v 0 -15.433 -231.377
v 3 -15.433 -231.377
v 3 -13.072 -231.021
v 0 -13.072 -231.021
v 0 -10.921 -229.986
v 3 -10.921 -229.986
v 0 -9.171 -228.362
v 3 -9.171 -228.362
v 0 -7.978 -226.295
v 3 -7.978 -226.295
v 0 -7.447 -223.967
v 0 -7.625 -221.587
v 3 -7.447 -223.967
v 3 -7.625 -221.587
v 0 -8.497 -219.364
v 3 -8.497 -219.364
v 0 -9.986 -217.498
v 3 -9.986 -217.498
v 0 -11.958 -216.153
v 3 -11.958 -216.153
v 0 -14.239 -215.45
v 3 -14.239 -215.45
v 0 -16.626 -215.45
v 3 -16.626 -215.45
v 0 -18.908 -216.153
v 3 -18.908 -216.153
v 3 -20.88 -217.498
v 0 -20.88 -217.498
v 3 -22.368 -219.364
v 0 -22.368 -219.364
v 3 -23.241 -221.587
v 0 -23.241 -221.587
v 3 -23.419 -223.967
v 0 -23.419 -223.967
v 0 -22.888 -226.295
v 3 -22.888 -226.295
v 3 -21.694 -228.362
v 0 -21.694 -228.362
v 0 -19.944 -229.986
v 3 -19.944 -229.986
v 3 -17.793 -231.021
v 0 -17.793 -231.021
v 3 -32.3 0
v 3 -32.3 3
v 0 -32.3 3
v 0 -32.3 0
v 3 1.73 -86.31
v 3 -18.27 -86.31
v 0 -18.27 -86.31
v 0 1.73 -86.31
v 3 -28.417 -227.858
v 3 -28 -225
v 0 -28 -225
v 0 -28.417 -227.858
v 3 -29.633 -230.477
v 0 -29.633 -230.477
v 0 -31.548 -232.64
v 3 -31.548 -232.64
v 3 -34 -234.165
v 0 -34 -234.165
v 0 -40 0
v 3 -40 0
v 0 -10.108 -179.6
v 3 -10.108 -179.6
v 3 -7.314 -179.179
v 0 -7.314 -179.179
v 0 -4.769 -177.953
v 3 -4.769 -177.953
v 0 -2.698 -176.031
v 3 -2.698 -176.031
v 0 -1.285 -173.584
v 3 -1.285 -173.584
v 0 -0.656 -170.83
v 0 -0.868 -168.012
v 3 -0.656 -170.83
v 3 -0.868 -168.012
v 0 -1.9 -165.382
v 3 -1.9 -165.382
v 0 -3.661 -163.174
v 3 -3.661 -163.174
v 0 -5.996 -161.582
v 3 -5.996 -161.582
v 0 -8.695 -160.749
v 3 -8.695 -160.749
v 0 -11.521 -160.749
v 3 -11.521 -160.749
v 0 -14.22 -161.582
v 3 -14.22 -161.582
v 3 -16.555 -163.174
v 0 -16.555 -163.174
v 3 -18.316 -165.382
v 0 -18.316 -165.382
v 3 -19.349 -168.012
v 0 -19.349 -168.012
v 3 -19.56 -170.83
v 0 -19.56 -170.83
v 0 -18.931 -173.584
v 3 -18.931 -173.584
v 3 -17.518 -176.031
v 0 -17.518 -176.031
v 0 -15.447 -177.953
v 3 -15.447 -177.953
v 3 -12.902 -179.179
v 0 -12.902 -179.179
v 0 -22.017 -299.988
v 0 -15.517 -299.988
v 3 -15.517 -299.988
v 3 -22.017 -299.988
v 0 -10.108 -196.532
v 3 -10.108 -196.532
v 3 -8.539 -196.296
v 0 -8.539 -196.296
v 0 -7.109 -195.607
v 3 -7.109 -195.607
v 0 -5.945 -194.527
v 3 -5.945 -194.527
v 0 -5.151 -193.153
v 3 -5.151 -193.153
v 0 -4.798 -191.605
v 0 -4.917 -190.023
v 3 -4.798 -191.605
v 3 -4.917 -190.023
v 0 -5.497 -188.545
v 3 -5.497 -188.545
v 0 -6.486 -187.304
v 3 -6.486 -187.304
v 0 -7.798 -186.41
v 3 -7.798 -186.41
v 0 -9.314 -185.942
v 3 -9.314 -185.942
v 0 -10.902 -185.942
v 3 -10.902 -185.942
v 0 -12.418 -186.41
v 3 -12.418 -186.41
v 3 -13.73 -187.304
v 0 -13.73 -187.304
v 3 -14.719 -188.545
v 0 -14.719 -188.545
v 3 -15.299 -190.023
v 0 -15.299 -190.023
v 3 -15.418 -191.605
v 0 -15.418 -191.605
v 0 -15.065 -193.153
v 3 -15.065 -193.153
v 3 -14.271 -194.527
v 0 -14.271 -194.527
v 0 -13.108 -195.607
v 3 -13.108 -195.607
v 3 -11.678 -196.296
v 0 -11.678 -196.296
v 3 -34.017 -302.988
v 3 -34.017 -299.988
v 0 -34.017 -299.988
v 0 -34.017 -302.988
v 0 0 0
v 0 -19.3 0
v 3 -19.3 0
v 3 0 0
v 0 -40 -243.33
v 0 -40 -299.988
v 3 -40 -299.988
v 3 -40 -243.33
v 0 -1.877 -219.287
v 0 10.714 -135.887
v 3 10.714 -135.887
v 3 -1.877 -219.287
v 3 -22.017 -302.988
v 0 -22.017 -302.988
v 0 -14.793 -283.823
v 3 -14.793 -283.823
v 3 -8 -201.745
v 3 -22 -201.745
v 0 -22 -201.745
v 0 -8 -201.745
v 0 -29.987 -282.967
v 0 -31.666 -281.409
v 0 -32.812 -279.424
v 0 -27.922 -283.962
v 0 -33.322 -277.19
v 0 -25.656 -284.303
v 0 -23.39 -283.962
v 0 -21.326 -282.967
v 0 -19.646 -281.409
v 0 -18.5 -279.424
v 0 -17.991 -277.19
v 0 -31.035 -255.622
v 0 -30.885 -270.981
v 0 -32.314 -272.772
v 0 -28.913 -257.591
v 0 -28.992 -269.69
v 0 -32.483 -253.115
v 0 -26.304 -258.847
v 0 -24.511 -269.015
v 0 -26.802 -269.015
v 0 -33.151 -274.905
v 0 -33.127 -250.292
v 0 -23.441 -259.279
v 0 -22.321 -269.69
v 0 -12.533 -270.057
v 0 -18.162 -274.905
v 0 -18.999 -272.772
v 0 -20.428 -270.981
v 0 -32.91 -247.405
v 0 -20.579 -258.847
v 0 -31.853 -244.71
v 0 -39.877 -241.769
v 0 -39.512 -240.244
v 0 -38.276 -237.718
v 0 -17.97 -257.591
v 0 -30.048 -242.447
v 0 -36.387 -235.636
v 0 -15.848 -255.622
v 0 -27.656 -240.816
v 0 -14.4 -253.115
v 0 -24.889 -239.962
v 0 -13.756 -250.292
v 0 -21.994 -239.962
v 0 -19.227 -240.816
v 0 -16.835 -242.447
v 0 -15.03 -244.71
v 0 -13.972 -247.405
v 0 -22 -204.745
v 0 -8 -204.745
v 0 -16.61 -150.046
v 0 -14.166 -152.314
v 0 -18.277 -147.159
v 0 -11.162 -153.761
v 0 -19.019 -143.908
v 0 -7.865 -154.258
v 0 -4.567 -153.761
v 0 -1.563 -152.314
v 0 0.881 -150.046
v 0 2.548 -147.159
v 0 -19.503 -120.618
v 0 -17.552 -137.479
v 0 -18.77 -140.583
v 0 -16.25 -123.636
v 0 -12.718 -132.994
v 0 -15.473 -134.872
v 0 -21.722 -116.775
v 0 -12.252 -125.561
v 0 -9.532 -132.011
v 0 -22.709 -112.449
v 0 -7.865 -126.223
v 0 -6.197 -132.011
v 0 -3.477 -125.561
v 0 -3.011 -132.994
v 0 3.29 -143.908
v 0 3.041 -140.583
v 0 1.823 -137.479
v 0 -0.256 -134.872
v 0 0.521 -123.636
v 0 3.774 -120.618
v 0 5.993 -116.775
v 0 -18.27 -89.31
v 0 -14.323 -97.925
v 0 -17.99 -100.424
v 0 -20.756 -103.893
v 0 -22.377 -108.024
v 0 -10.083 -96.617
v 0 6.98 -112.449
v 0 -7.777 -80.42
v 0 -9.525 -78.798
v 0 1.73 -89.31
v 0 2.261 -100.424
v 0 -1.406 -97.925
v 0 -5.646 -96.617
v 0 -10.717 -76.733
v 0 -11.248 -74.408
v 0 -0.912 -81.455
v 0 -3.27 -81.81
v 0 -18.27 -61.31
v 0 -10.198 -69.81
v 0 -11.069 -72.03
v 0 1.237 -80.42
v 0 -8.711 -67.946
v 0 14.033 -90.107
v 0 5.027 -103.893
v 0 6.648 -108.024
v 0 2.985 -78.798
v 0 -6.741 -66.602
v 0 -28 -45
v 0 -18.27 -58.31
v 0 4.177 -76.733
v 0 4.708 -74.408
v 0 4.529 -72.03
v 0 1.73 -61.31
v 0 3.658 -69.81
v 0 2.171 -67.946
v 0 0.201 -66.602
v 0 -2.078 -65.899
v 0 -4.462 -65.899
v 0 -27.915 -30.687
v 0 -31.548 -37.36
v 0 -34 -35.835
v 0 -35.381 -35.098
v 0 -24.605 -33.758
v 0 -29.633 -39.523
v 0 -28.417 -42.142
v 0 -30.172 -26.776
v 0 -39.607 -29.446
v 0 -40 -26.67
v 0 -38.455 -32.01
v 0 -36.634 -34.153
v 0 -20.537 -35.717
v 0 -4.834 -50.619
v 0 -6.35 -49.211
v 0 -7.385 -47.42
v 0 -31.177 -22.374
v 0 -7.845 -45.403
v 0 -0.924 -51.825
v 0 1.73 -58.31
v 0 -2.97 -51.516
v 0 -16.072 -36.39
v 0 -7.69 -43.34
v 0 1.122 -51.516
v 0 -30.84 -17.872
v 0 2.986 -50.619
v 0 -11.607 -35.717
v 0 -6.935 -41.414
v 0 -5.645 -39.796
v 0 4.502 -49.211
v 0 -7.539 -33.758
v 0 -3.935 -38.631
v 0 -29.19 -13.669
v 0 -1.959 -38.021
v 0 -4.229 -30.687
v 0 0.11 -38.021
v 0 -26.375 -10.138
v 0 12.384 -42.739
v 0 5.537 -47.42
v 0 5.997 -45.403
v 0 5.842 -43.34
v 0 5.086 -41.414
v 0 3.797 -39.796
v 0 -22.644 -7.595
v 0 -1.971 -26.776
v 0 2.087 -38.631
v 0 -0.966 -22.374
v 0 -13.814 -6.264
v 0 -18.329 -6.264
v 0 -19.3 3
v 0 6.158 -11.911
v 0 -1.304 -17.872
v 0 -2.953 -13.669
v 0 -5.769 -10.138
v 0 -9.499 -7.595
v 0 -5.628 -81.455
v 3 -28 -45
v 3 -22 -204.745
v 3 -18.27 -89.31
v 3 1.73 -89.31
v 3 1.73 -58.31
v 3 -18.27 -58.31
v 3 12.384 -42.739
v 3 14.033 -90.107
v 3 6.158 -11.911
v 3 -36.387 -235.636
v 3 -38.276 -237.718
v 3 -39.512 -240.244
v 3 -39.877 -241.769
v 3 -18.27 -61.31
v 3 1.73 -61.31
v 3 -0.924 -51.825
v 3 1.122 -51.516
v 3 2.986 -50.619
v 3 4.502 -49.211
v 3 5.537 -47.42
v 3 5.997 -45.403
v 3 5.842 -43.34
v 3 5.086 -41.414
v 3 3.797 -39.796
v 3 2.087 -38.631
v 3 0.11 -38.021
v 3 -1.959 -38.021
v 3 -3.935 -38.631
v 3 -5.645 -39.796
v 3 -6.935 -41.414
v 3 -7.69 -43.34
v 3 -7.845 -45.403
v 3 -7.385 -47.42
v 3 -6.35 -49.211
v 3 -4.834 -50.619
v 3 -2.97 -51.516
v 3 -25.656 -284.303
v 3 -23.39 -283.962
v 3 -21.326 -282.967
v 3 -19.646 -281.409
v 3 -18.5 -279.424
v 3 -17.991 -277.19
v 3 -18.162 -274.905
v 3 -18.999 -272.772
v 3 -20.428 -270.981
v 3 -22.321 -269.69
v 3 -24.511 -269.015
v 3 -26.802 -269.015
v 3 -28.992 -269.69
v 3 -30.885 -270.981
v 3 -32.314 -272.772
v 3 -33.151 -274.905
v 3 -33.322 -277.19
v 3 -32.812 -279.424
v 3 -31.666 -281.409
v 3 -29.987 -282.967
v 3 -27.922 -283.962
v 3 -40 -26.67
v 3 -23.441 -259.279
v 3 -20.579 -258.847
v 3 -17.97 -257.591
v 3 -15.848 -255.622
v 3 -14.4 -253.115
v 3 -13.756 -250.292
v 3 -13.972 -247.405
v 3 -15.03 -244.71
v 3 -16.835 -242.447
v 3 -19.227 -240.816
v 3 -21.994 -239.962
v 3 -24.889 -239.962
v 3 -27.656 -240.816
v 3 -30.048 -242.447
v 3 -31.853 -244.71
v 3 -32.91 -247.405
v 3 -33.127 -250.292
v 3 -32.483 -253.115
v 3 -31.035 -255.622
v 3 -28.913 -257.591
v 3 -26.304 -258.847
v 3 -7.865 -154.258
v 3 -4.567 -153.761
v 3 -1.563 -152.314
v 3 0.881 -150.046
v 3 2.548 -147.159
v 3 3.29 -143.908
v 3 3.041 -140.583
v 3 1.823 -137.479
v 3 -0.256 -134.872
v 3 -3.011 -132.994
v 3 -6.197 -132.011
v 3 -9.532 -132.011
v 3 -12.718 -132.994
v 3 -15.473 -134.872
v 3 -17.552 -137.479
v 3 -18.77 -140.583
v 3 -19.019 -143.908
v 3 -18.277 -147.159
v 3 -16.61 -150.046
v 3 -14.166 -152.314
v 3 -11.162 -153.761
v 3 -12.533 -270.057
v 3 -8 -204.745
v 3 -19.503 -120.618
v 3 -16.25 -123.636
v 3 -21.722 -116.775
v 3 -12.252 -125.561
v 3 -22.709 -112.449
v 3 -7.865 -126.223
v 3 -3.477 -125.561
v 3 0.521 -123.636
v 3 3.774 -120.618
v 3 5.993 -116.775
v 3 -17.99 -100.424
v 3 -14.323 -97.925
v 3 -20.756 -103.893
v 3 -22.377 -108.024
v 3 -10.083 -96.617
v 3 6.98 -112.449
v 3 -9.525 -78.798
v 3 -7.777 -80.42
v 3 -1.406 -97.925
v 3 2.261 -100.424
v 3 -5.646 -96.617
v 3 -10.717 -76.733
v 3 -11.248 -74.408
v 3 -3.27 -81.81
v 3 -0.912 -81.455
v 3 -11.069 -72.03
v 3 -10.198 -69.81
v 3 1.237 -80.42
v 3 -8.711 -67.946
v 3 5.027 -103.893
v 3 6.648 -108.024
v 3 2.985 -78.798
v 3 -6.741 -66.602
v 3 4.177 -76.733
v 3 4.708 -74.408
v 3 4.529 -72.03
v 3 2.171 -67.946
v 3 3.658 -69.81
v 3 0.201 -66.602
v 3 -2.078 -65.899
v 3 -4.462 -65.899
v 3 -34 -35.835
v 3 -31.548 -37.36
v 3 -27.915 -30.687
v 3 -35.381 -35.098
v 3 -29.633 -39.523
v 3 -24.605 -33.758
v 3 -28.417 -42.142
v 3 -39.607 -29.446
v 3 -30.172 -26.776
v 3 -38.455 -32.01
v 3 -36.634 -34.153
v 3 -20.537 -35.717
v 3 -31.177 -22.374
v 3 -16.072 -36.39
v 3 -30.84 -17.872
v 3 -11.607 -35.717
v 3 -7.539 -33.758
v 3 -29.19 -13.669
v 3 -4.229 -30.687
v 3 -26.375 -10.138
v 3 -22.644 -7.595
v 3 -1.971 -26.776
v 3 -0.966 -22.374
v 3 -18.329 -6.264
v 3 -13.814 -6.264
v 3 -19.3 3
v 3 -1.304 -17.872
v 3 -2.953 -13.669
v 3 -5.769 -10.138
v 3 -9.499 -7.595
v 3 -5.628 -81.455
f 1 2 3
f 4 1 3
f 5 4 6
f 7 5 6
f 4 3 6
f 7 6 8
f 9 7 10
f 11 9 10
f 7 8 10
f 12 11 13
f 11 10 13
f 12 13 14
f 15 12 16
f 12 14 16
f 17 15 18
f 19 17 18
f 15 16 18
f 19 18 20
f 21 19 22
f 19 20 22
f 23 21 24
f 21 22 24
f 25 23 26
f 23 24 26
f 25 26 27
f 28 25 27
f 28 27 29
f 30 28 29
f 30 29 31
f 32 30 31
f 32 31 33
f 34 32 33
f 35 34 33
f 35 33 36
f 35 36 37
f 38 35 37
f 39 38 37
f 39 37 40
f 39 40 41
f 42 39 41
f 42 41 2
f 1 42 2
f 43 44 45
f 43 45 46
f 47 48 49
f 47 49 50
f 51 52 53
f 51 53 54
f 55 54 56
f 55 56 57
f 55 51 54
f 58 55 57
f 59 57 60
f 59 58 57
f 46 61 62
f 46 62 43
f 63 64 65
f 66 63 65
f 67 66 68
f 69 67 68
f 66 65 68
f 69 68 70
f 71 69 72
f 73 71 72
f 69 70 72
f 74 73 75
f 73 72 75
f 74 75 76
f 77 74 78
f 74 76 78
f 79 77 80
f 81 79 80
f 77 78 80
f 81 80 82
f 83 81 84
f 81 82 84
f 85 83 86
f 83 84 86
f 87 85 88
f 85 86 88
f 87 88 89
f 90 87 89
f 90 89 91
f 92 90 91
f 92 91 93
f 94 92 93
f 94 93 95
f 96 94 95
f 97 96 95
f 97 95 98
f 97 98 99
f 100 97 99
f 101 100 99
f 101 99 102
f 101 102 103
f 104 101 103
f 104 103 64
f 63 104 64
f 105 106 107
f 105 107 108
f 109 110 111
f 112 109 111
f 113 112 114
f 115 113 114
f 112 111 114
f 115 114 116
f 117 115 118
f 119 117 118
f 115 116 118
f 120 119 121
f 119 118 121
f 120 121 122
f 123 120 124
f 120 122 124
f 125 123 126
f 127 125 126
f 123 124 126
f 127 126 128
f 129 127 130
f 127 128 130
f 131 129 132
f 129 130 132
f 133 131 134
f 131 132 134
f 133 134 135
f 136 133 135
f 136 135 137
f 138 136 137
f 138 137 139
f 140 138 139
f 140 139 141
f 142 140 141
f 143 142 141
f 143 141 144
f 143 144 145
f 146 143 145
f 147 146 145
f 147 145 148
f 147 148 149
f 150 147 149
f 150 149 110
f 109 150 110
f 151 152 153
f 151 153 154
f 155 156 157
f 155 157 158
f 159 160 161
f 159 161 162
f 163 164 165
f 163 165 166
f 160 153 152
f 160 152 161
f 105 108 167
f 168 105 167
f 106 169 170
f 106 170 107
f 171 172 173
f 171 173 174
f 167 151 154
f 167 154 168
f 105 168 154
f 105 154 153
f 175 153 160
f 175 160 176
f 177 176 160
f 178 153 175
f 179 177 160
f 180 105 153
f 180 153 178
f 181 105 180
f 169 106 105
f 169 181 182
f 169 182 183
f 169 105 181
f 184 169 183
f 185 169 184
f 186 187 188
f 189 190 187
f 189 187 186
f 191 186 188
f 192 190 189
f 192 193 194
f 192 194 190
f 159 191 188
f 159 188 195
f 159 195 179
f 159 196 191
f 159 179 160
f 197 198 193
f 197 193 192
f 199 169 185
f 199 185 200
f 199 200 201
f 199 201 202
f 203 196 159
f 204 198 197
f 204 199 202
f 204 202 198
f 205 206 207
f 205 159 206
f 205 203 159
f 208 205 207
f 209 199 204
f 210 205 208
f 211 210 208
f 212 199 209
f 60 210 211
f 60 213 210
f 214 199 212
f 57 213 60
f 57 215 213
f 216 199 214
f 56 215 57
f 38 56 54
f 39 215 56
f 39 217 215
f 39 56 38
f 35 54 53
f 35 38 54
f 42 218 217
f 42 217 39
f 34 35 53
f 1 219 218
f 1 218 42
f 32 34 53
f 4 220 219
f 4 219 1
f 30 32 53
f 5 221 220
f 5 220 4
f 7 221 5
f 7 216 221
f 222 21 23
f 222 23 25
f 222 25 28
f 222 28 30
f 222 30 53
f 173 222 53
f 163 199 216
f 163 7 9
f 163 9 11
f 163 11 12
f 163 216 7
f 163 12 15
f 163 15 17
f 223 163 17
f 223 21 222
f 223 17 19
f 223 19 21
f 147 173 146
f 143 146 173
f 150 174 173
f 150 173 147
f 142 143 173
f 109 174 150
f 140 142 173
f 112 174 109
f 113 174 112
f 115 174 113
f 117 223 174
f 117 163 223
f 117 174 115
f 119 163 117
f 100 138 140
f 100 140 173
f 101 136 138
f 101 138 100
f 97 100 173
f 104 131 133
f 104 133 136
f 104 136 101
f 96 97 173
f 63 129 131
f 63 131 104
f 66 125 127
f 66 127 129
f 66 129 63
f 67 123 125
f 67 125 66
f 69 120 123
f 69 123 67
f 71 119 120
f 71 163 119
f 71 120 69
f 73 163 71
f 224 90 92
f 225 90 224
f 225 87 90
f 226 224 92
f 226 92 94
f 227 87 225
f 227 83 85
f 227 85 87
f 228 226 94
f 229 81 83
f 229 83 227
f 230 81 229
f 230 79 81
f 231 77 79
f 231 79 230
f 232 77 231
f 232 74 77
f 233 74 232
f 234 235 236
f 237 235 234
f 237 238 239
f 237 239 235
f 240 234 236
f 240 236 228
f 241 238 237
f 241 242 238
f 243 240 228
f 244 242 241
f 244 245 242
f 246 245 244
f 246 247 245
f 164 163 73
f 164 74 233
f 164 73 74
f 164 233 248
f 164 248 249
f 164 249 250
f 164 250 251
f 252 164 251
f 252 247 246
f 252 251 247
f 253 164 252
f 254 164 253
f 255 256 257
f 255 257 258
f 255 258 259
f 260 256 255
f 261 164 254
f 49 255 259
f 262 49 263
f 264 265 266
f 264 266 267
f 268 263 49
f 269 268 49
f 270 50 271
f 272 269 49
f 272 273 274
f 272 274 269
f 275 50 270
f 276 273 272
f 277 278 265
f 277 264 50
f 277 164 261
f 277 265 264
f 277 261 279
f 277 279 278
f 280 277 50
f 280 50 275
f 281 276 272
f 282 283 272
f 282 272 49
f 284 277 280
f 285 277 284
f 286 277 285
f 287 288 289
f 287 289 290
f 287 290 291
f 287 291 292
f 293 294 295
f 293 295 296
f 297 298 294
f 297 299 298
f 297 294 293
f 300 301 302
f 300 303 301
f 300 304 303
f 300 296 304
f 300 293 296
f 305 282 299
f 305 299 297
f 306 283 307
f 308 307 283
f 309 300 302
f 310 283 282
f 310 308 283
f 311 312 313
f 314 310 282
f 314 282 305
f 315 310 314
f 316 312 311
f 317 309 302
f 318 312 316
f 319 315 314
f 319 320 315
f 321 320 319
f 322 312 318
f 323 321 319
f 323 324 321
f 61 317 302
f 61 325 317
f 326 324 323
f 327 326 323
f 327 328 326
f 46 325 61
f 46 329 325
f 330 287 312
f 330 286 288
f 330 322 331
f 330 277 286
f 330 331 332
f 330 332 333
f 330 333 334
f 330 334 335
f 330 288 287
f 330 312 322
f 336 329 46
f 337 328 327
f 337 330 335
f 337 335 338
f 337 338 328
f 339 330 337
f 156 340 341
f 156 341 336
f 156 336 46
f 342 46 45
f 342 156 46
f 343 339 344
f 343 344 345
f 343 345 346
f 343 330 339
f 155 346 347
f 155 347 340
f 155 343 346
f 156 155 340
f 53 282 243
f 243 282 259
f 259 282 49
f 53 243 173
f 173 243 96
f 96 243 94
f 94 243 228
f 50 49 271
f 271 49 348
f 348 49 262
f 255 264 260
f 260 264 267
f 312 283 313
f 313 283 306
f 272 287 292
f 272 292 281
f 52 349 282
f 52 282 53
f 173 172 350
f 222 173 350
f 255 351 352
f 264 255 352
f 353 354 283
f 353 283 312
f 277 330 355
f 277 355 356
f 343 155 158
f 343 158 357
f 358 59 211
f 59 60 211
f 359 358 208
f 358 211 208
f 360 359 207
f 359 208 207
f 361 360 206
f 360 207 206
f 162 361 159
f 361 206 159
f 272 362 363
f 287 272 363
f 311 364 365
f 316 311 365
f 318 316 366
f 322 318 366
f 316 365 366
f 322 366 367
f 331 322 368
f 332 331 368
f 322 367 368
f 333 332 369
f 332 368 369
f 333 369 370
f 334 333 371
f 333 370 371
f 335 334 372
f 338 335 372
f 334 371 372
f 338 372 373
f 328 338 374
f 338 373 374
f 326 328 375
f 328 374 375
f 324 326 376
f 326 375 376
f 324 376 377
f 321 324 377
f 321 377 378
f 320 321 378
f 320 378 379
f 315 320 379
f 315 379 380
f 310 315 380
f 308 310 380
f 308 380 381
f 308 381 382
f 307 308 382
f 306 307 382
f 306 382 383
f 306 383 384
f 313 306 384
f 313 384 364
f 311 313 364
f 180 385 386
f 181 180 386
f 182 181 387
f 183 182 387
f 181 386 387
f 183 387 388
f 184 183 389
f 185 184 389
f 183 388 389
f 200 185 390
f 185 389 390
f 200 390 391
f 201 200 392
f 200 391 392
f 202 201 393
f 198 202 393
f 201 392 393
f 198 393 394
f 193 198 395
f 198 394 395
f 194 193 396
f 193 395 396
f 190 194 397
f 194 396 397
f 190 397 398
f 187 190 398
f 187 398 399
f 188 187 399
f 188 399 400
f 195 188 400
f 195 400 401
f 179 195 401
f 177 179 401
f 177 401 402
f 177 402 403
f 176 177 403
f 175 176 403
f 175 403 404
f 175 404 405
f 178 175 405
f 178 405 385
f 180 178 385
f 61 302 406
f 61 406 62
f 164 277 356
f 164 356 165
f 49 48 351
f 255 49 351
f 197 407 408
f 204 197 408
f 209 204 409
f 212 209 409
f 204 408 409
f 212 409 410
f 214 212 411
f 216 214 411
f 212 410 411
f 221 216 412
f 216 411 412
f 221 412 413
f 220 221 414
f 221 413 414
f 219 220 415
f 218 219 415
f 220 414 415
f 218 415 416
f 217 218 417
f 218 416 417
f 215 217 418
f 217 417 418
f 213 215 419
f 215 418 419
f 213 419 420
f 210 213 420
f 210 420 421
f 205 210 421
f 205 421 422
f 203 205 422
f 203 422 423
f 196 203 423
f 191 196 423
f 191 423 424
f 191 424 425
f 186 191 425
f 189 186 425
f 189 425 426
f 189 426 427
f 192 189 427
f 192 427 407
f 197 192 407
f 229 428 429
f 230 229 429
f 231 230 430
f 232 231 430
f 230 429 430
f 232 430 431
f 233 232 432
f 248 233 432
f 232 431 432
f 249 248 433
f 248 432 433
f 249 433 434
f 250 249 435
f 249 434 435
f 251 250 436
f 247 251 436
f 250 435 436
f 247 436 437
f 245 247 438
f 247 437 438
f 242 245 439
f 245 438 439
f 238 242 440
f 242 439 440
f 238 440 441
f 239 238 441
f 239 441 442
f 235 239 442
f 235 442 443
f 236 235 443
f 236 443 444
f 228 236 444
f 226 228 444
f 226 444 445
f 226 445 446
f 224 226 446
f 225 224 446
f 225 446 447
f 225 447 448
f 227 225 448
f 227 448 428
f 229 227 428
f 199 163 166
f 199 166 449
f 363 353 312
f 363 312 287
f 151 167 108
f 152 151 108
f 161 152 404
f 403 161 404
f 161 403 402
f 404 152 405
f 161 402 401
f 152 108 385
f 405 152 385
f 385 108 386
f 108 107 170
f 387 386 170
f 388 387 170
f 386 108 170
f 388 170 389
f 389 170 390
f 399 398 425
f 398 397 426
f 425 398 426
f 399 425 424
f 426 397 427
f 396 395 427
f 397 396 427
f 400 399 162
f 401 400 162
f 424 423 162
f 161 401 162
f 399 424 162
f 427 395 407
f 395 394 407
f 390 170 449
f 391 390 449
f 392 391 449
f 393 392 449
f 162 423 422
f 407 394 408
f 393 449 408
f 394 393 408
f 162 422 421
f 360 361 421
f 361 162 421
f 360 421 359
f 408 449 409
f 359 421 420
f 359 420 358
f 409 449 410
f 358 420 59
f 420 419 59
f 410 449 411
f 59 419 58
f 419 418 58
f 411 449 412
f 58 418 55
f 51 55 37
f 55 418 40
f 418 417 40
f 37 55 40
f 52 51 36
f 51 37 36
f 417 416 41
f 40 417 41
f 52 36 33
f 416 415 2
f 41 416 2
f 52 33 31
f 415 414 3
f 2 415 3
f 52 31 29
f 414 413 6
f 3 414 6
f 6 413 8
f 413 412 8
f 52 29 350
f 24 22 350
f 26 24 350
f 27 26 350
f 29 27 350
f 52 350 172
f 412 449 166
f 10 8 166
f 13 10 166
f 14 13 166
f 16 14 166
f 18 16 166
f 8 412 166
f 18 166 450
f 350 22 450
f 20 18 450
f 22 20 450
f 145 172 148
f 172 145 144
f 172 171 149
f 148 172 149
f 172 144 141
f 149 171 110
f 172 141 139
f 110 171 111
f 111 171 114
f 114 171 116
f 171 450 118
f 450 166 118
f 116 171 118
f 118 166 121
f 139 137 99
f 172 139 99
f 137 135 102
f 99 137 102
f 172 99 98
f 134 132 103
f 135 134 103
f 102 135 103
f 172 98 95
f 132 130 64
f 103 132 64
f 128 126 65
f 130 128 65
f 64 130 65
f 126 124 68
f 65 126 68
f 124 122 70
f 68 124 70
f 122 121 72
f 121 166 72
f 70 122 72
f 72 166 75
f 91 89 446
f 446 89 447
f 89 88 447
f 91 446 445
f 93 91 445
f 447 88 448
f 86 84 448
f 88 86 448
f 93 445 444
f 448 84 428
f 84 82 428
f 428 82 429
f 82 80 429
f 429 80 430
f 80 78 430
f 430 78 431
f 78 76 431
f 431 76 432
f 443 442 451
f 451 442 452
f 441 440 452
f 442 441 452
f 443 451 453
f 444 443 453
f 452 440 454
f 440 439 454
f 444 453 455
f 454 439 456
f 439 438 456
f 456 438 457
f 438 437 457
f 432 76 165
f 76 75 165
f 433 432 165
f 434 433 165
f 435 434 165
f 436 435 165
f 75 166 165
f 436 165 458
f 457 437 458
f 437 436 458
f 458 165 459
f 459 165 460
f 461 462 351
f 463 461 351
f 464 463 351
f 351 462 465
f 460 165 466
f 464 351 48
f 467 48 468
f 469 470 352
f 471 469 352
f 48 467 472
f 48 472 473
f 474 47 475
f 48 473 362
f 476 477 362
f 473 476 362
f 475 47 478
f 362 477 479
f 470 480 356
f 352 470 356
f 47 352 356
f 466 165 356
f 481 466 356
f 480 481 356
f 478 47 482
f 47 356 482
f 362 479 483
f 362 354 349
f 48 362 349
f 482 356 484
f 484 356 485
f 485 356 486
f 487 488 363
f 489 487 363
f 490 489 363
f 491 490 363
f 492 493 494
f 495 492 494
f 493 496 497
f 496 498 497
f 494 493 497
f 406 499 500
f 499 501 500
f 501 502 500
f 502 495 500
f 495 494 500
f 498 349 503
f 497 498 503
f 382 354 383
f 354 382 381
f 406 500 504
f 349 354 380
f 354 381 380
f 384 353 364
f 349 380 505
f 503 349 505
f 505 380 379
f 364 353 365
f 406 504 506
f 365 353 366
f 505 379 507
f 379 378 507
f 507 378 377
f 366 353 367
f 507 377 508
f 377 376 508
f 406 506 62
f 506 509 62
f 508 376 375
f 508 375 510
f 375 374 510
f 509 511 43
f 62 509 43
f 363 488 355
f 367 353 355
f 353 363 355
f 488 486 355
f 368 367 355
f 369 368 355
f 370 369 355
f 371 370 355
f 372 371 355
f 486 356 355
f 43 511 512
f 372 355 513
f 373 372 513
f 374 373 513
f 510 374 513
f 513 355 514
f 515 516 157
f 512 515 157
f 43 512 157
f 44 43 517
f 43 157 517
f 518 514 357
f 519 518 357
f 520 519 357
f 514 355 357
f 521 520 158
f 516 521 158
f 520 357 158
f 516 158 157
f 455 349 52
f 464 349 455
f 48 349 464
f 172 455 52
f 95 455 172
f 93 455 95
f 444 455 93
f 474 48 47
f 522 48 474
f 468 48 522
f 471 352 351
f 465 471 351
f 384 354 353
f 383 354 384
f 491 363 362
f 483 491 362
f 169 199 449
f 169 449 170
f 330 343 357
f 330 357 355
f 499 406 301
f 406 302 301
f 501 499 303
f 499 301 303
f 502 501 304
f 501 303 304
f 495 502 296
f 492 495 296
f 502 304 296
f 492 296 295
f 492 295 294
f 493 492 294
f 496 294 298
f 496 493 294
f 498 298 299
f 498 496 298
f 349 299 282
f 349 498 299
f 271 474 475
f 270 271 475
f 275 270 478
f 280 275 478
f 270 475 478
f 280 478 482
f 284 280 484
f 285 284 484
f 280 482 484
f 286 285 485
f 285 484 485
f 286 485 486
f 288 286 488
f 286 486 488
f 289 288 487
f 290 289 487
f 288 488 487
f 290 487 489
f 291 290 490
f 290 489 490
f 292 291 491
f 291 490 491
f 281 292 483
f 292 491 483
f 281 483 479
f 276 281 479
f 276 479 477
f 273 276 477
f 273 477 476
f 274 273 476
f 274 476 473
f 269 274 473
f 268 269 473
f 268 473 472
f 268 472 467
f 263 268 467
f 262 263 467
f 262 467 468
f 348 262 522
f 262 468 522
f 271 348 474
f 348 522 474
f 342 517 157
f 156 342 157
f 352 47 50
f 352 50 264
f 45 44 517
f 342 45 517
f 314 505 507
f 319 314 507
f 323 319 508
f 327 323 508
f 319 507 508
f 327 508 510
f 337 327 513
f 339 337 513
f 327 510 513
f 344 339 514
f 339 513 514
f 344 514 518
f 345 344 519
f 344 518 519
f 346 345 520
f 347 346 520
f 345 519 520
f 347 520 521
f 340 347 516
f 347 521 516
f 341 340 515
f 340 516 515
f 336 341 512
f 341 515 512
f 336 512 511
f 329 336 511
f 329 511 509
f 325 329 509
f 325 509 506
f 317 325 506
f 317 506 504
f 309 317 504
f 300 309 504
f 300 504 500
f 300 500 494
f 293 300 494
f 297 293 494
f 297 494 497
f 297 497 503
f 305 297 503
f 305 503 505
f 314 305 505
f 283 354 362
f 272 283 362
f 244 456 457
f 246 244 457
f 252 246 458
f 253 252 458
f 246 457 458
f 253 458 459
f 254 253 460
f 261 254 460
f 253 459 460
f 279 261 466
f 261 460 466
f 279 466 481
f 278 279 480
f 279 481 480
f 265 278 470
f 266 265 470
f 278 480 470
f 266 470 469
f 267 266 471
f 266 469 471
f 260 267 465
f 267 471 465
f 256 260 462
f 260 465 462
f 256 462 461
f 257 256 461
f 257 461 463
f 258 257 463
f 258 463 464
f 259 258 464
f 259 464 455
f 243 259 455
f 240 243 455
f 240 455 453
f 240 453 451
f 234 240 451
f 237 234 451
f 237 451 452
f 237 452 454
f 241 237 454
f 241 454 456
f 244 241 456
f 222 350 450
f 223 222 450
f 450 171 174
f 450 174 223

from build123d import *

# Parameters (mm, degrees)
BOSS_EXTRUDE1_DEPTH = 3
CUT_EXTRUDE1_DEPTH  = 3
FILLET1_R           = 10
SKETCH3_R           = 8
CUT_EXTRUDE2_DEPTH  = 3
SKETCH5_W           = 3
SKETCH5_H           = 13
SKETCH5_H_2         = 12
BOSS_EXTRUDE2_DEPTH = 3
SKETCH6_R           = 15.147681316
SKETCH6_R_2         = 6.940415837
SKETCH6_R_3         = 14.88620922
SKETCH6_R_4         = 11.185928508
SKETCH6_R_5         = 9.478125157
SKETCH6_R_6         = 5.324718802
SKETCH6_R_7         = 8.008616256
SKETCH6_R_8         = 9.712526273
SKETCH6_R_9         = 7.687216176
SKETCH6_W           = 3
SKETCH6_H           = 20
SKETCH6_H_2         = 14
CUT_EXTRUDE3_DEPTH  = 10


with BuildPart() as part:
    # Sketch1 → Boss-Extrude1 (new body)
    with BuildSketch(Plane(origin=(0, 0, 0), x_dir=(0, 0, -1), z_dir=(1, 0, 0))):
        Polygon((0, 0), (11.910798094, 6.158004928), (42.739414765, 12.383521095), (90.106781804, 14.033136775), (135.887385092, 10.713704644), (219.287488067, -1.876713431), (270.057015241, -12.532639482), (283.823146281, -14.792882614), (299.988096251, -15.517362165), (299.988096251, -40), (0, -40), align=None)
    extrude(amount=BOSS_EXTRUDE1_DEPTH)

    # Sketch2 → Cut-Extrude1 (cut)
    with BuildSketch(Plane(origin=(3, 0, 0), x_dir=(0, 0, -1), z_dir=(1, 0, 0))):
        with BuildLine():
            Line((35, -40), (35, -38))
            ThreePointArc((35, -38), (37.928932188, -30.928932188), (45, -28))
            Line((45, -28), (225, -28))
            ThreePointArc((225, -28), (232.071067812, -30.928932188), (235, -38))
            Line((235, -38), (235, -40))
            Line((235, -40), (35, -40))
        make_face()
    extrude(amount=-CUT_EXTRUDE1_DEPTH, mode=Mode.SUBTRACT)

    # Fillet1
    fillet1_edges = [part.edges().sort_by_distance(p)[0] for p in [
        (1.5, -40, -235),
        (1.5, -40, -35),
    ]]
    fillet(fillet1_edges, radius=FILLET1_R)

    # Sketch3 → Cut-Extrude2 (cut)
    with BuildSketch(Plane(origin=(3, 0, 0), x_dir=(0, 0, -1), z_dir=(1, 0, 0))):
        with Locations((73.81, -3.27)):
            Circle(SKETCH3_R)
    extrude(amount=-CUT_EXTRUDE2_DEPTH, mode=Mode.SUBTRACT)

    # Sketch5 → Boss-Extrude2 (add)
    with BuildSketch(Plane(origin=(3, 0, 0), x_dir=(0, 0, -1), z_dir=(1, 0, 0))):
        with Locations((-1.5, -25.8)):
            Rectangle(SKETCH5_W, SKETCH5_H)
        with Locations((301.488096251, -28.017362165)):
            Rectangle(SKETCH5_W, SKETCH5_H_2)
    extrude(amount=-BOSS_EXTRUDE2_DEPTH)

    # Sketch6 → Cut-Extrude3 (cut)
    with BuildSketch(Plane(origin=(3, 0, 0), x_dir=(0, 0, -1), z_dir=(1, 0, 0))):
        with Locations((21.242347481, -16.071768518)):
            Circle(SKETCH6_R)
        with Locations((44.884098964, -0.924087202)):
            Circle(SKETCH6_R_2)
        with Locations((111.33658962, -7.864503039)):
            Circle(SKETCH6_R_3)
        with Locations((143.071913682, -7.864503039)):
            Circle(SKETCH6_R_4)
        with Locations((170.121485199, -10.108083459)):
            Circle(SKETCH6_R_5)
        with Locations((191.207371657, -10.108083459)):
            Circle(SKETCH6_R_6)
        with Locations((223.368673224, -15.432802262)):
            Circle(SKETCH6_R_7)
        with Locations((249.566289732, -23.441418517)):
            Circle(SKETCH6_R_8)
        with Locations((276.615861249, -25.656262362)):
            Circle(SKETCH6_R_9)
        with Locations((59.81, -8.27)):
            Rectangle(SKETCH6_W, SKETCH6_H)
        with Locations((87.81, -8.27)):
            Rectangle(SKETCH6_W, SKETCH6_H)
        with Locations((203.245, -15)):
            Rectangle(SKETCH6_W, SKETCH6_H_2)
    extrude(amount=-CUT_EXTRUDE3_DEPTH, mode=Mode.SUBTRACT)


solid = part.part
